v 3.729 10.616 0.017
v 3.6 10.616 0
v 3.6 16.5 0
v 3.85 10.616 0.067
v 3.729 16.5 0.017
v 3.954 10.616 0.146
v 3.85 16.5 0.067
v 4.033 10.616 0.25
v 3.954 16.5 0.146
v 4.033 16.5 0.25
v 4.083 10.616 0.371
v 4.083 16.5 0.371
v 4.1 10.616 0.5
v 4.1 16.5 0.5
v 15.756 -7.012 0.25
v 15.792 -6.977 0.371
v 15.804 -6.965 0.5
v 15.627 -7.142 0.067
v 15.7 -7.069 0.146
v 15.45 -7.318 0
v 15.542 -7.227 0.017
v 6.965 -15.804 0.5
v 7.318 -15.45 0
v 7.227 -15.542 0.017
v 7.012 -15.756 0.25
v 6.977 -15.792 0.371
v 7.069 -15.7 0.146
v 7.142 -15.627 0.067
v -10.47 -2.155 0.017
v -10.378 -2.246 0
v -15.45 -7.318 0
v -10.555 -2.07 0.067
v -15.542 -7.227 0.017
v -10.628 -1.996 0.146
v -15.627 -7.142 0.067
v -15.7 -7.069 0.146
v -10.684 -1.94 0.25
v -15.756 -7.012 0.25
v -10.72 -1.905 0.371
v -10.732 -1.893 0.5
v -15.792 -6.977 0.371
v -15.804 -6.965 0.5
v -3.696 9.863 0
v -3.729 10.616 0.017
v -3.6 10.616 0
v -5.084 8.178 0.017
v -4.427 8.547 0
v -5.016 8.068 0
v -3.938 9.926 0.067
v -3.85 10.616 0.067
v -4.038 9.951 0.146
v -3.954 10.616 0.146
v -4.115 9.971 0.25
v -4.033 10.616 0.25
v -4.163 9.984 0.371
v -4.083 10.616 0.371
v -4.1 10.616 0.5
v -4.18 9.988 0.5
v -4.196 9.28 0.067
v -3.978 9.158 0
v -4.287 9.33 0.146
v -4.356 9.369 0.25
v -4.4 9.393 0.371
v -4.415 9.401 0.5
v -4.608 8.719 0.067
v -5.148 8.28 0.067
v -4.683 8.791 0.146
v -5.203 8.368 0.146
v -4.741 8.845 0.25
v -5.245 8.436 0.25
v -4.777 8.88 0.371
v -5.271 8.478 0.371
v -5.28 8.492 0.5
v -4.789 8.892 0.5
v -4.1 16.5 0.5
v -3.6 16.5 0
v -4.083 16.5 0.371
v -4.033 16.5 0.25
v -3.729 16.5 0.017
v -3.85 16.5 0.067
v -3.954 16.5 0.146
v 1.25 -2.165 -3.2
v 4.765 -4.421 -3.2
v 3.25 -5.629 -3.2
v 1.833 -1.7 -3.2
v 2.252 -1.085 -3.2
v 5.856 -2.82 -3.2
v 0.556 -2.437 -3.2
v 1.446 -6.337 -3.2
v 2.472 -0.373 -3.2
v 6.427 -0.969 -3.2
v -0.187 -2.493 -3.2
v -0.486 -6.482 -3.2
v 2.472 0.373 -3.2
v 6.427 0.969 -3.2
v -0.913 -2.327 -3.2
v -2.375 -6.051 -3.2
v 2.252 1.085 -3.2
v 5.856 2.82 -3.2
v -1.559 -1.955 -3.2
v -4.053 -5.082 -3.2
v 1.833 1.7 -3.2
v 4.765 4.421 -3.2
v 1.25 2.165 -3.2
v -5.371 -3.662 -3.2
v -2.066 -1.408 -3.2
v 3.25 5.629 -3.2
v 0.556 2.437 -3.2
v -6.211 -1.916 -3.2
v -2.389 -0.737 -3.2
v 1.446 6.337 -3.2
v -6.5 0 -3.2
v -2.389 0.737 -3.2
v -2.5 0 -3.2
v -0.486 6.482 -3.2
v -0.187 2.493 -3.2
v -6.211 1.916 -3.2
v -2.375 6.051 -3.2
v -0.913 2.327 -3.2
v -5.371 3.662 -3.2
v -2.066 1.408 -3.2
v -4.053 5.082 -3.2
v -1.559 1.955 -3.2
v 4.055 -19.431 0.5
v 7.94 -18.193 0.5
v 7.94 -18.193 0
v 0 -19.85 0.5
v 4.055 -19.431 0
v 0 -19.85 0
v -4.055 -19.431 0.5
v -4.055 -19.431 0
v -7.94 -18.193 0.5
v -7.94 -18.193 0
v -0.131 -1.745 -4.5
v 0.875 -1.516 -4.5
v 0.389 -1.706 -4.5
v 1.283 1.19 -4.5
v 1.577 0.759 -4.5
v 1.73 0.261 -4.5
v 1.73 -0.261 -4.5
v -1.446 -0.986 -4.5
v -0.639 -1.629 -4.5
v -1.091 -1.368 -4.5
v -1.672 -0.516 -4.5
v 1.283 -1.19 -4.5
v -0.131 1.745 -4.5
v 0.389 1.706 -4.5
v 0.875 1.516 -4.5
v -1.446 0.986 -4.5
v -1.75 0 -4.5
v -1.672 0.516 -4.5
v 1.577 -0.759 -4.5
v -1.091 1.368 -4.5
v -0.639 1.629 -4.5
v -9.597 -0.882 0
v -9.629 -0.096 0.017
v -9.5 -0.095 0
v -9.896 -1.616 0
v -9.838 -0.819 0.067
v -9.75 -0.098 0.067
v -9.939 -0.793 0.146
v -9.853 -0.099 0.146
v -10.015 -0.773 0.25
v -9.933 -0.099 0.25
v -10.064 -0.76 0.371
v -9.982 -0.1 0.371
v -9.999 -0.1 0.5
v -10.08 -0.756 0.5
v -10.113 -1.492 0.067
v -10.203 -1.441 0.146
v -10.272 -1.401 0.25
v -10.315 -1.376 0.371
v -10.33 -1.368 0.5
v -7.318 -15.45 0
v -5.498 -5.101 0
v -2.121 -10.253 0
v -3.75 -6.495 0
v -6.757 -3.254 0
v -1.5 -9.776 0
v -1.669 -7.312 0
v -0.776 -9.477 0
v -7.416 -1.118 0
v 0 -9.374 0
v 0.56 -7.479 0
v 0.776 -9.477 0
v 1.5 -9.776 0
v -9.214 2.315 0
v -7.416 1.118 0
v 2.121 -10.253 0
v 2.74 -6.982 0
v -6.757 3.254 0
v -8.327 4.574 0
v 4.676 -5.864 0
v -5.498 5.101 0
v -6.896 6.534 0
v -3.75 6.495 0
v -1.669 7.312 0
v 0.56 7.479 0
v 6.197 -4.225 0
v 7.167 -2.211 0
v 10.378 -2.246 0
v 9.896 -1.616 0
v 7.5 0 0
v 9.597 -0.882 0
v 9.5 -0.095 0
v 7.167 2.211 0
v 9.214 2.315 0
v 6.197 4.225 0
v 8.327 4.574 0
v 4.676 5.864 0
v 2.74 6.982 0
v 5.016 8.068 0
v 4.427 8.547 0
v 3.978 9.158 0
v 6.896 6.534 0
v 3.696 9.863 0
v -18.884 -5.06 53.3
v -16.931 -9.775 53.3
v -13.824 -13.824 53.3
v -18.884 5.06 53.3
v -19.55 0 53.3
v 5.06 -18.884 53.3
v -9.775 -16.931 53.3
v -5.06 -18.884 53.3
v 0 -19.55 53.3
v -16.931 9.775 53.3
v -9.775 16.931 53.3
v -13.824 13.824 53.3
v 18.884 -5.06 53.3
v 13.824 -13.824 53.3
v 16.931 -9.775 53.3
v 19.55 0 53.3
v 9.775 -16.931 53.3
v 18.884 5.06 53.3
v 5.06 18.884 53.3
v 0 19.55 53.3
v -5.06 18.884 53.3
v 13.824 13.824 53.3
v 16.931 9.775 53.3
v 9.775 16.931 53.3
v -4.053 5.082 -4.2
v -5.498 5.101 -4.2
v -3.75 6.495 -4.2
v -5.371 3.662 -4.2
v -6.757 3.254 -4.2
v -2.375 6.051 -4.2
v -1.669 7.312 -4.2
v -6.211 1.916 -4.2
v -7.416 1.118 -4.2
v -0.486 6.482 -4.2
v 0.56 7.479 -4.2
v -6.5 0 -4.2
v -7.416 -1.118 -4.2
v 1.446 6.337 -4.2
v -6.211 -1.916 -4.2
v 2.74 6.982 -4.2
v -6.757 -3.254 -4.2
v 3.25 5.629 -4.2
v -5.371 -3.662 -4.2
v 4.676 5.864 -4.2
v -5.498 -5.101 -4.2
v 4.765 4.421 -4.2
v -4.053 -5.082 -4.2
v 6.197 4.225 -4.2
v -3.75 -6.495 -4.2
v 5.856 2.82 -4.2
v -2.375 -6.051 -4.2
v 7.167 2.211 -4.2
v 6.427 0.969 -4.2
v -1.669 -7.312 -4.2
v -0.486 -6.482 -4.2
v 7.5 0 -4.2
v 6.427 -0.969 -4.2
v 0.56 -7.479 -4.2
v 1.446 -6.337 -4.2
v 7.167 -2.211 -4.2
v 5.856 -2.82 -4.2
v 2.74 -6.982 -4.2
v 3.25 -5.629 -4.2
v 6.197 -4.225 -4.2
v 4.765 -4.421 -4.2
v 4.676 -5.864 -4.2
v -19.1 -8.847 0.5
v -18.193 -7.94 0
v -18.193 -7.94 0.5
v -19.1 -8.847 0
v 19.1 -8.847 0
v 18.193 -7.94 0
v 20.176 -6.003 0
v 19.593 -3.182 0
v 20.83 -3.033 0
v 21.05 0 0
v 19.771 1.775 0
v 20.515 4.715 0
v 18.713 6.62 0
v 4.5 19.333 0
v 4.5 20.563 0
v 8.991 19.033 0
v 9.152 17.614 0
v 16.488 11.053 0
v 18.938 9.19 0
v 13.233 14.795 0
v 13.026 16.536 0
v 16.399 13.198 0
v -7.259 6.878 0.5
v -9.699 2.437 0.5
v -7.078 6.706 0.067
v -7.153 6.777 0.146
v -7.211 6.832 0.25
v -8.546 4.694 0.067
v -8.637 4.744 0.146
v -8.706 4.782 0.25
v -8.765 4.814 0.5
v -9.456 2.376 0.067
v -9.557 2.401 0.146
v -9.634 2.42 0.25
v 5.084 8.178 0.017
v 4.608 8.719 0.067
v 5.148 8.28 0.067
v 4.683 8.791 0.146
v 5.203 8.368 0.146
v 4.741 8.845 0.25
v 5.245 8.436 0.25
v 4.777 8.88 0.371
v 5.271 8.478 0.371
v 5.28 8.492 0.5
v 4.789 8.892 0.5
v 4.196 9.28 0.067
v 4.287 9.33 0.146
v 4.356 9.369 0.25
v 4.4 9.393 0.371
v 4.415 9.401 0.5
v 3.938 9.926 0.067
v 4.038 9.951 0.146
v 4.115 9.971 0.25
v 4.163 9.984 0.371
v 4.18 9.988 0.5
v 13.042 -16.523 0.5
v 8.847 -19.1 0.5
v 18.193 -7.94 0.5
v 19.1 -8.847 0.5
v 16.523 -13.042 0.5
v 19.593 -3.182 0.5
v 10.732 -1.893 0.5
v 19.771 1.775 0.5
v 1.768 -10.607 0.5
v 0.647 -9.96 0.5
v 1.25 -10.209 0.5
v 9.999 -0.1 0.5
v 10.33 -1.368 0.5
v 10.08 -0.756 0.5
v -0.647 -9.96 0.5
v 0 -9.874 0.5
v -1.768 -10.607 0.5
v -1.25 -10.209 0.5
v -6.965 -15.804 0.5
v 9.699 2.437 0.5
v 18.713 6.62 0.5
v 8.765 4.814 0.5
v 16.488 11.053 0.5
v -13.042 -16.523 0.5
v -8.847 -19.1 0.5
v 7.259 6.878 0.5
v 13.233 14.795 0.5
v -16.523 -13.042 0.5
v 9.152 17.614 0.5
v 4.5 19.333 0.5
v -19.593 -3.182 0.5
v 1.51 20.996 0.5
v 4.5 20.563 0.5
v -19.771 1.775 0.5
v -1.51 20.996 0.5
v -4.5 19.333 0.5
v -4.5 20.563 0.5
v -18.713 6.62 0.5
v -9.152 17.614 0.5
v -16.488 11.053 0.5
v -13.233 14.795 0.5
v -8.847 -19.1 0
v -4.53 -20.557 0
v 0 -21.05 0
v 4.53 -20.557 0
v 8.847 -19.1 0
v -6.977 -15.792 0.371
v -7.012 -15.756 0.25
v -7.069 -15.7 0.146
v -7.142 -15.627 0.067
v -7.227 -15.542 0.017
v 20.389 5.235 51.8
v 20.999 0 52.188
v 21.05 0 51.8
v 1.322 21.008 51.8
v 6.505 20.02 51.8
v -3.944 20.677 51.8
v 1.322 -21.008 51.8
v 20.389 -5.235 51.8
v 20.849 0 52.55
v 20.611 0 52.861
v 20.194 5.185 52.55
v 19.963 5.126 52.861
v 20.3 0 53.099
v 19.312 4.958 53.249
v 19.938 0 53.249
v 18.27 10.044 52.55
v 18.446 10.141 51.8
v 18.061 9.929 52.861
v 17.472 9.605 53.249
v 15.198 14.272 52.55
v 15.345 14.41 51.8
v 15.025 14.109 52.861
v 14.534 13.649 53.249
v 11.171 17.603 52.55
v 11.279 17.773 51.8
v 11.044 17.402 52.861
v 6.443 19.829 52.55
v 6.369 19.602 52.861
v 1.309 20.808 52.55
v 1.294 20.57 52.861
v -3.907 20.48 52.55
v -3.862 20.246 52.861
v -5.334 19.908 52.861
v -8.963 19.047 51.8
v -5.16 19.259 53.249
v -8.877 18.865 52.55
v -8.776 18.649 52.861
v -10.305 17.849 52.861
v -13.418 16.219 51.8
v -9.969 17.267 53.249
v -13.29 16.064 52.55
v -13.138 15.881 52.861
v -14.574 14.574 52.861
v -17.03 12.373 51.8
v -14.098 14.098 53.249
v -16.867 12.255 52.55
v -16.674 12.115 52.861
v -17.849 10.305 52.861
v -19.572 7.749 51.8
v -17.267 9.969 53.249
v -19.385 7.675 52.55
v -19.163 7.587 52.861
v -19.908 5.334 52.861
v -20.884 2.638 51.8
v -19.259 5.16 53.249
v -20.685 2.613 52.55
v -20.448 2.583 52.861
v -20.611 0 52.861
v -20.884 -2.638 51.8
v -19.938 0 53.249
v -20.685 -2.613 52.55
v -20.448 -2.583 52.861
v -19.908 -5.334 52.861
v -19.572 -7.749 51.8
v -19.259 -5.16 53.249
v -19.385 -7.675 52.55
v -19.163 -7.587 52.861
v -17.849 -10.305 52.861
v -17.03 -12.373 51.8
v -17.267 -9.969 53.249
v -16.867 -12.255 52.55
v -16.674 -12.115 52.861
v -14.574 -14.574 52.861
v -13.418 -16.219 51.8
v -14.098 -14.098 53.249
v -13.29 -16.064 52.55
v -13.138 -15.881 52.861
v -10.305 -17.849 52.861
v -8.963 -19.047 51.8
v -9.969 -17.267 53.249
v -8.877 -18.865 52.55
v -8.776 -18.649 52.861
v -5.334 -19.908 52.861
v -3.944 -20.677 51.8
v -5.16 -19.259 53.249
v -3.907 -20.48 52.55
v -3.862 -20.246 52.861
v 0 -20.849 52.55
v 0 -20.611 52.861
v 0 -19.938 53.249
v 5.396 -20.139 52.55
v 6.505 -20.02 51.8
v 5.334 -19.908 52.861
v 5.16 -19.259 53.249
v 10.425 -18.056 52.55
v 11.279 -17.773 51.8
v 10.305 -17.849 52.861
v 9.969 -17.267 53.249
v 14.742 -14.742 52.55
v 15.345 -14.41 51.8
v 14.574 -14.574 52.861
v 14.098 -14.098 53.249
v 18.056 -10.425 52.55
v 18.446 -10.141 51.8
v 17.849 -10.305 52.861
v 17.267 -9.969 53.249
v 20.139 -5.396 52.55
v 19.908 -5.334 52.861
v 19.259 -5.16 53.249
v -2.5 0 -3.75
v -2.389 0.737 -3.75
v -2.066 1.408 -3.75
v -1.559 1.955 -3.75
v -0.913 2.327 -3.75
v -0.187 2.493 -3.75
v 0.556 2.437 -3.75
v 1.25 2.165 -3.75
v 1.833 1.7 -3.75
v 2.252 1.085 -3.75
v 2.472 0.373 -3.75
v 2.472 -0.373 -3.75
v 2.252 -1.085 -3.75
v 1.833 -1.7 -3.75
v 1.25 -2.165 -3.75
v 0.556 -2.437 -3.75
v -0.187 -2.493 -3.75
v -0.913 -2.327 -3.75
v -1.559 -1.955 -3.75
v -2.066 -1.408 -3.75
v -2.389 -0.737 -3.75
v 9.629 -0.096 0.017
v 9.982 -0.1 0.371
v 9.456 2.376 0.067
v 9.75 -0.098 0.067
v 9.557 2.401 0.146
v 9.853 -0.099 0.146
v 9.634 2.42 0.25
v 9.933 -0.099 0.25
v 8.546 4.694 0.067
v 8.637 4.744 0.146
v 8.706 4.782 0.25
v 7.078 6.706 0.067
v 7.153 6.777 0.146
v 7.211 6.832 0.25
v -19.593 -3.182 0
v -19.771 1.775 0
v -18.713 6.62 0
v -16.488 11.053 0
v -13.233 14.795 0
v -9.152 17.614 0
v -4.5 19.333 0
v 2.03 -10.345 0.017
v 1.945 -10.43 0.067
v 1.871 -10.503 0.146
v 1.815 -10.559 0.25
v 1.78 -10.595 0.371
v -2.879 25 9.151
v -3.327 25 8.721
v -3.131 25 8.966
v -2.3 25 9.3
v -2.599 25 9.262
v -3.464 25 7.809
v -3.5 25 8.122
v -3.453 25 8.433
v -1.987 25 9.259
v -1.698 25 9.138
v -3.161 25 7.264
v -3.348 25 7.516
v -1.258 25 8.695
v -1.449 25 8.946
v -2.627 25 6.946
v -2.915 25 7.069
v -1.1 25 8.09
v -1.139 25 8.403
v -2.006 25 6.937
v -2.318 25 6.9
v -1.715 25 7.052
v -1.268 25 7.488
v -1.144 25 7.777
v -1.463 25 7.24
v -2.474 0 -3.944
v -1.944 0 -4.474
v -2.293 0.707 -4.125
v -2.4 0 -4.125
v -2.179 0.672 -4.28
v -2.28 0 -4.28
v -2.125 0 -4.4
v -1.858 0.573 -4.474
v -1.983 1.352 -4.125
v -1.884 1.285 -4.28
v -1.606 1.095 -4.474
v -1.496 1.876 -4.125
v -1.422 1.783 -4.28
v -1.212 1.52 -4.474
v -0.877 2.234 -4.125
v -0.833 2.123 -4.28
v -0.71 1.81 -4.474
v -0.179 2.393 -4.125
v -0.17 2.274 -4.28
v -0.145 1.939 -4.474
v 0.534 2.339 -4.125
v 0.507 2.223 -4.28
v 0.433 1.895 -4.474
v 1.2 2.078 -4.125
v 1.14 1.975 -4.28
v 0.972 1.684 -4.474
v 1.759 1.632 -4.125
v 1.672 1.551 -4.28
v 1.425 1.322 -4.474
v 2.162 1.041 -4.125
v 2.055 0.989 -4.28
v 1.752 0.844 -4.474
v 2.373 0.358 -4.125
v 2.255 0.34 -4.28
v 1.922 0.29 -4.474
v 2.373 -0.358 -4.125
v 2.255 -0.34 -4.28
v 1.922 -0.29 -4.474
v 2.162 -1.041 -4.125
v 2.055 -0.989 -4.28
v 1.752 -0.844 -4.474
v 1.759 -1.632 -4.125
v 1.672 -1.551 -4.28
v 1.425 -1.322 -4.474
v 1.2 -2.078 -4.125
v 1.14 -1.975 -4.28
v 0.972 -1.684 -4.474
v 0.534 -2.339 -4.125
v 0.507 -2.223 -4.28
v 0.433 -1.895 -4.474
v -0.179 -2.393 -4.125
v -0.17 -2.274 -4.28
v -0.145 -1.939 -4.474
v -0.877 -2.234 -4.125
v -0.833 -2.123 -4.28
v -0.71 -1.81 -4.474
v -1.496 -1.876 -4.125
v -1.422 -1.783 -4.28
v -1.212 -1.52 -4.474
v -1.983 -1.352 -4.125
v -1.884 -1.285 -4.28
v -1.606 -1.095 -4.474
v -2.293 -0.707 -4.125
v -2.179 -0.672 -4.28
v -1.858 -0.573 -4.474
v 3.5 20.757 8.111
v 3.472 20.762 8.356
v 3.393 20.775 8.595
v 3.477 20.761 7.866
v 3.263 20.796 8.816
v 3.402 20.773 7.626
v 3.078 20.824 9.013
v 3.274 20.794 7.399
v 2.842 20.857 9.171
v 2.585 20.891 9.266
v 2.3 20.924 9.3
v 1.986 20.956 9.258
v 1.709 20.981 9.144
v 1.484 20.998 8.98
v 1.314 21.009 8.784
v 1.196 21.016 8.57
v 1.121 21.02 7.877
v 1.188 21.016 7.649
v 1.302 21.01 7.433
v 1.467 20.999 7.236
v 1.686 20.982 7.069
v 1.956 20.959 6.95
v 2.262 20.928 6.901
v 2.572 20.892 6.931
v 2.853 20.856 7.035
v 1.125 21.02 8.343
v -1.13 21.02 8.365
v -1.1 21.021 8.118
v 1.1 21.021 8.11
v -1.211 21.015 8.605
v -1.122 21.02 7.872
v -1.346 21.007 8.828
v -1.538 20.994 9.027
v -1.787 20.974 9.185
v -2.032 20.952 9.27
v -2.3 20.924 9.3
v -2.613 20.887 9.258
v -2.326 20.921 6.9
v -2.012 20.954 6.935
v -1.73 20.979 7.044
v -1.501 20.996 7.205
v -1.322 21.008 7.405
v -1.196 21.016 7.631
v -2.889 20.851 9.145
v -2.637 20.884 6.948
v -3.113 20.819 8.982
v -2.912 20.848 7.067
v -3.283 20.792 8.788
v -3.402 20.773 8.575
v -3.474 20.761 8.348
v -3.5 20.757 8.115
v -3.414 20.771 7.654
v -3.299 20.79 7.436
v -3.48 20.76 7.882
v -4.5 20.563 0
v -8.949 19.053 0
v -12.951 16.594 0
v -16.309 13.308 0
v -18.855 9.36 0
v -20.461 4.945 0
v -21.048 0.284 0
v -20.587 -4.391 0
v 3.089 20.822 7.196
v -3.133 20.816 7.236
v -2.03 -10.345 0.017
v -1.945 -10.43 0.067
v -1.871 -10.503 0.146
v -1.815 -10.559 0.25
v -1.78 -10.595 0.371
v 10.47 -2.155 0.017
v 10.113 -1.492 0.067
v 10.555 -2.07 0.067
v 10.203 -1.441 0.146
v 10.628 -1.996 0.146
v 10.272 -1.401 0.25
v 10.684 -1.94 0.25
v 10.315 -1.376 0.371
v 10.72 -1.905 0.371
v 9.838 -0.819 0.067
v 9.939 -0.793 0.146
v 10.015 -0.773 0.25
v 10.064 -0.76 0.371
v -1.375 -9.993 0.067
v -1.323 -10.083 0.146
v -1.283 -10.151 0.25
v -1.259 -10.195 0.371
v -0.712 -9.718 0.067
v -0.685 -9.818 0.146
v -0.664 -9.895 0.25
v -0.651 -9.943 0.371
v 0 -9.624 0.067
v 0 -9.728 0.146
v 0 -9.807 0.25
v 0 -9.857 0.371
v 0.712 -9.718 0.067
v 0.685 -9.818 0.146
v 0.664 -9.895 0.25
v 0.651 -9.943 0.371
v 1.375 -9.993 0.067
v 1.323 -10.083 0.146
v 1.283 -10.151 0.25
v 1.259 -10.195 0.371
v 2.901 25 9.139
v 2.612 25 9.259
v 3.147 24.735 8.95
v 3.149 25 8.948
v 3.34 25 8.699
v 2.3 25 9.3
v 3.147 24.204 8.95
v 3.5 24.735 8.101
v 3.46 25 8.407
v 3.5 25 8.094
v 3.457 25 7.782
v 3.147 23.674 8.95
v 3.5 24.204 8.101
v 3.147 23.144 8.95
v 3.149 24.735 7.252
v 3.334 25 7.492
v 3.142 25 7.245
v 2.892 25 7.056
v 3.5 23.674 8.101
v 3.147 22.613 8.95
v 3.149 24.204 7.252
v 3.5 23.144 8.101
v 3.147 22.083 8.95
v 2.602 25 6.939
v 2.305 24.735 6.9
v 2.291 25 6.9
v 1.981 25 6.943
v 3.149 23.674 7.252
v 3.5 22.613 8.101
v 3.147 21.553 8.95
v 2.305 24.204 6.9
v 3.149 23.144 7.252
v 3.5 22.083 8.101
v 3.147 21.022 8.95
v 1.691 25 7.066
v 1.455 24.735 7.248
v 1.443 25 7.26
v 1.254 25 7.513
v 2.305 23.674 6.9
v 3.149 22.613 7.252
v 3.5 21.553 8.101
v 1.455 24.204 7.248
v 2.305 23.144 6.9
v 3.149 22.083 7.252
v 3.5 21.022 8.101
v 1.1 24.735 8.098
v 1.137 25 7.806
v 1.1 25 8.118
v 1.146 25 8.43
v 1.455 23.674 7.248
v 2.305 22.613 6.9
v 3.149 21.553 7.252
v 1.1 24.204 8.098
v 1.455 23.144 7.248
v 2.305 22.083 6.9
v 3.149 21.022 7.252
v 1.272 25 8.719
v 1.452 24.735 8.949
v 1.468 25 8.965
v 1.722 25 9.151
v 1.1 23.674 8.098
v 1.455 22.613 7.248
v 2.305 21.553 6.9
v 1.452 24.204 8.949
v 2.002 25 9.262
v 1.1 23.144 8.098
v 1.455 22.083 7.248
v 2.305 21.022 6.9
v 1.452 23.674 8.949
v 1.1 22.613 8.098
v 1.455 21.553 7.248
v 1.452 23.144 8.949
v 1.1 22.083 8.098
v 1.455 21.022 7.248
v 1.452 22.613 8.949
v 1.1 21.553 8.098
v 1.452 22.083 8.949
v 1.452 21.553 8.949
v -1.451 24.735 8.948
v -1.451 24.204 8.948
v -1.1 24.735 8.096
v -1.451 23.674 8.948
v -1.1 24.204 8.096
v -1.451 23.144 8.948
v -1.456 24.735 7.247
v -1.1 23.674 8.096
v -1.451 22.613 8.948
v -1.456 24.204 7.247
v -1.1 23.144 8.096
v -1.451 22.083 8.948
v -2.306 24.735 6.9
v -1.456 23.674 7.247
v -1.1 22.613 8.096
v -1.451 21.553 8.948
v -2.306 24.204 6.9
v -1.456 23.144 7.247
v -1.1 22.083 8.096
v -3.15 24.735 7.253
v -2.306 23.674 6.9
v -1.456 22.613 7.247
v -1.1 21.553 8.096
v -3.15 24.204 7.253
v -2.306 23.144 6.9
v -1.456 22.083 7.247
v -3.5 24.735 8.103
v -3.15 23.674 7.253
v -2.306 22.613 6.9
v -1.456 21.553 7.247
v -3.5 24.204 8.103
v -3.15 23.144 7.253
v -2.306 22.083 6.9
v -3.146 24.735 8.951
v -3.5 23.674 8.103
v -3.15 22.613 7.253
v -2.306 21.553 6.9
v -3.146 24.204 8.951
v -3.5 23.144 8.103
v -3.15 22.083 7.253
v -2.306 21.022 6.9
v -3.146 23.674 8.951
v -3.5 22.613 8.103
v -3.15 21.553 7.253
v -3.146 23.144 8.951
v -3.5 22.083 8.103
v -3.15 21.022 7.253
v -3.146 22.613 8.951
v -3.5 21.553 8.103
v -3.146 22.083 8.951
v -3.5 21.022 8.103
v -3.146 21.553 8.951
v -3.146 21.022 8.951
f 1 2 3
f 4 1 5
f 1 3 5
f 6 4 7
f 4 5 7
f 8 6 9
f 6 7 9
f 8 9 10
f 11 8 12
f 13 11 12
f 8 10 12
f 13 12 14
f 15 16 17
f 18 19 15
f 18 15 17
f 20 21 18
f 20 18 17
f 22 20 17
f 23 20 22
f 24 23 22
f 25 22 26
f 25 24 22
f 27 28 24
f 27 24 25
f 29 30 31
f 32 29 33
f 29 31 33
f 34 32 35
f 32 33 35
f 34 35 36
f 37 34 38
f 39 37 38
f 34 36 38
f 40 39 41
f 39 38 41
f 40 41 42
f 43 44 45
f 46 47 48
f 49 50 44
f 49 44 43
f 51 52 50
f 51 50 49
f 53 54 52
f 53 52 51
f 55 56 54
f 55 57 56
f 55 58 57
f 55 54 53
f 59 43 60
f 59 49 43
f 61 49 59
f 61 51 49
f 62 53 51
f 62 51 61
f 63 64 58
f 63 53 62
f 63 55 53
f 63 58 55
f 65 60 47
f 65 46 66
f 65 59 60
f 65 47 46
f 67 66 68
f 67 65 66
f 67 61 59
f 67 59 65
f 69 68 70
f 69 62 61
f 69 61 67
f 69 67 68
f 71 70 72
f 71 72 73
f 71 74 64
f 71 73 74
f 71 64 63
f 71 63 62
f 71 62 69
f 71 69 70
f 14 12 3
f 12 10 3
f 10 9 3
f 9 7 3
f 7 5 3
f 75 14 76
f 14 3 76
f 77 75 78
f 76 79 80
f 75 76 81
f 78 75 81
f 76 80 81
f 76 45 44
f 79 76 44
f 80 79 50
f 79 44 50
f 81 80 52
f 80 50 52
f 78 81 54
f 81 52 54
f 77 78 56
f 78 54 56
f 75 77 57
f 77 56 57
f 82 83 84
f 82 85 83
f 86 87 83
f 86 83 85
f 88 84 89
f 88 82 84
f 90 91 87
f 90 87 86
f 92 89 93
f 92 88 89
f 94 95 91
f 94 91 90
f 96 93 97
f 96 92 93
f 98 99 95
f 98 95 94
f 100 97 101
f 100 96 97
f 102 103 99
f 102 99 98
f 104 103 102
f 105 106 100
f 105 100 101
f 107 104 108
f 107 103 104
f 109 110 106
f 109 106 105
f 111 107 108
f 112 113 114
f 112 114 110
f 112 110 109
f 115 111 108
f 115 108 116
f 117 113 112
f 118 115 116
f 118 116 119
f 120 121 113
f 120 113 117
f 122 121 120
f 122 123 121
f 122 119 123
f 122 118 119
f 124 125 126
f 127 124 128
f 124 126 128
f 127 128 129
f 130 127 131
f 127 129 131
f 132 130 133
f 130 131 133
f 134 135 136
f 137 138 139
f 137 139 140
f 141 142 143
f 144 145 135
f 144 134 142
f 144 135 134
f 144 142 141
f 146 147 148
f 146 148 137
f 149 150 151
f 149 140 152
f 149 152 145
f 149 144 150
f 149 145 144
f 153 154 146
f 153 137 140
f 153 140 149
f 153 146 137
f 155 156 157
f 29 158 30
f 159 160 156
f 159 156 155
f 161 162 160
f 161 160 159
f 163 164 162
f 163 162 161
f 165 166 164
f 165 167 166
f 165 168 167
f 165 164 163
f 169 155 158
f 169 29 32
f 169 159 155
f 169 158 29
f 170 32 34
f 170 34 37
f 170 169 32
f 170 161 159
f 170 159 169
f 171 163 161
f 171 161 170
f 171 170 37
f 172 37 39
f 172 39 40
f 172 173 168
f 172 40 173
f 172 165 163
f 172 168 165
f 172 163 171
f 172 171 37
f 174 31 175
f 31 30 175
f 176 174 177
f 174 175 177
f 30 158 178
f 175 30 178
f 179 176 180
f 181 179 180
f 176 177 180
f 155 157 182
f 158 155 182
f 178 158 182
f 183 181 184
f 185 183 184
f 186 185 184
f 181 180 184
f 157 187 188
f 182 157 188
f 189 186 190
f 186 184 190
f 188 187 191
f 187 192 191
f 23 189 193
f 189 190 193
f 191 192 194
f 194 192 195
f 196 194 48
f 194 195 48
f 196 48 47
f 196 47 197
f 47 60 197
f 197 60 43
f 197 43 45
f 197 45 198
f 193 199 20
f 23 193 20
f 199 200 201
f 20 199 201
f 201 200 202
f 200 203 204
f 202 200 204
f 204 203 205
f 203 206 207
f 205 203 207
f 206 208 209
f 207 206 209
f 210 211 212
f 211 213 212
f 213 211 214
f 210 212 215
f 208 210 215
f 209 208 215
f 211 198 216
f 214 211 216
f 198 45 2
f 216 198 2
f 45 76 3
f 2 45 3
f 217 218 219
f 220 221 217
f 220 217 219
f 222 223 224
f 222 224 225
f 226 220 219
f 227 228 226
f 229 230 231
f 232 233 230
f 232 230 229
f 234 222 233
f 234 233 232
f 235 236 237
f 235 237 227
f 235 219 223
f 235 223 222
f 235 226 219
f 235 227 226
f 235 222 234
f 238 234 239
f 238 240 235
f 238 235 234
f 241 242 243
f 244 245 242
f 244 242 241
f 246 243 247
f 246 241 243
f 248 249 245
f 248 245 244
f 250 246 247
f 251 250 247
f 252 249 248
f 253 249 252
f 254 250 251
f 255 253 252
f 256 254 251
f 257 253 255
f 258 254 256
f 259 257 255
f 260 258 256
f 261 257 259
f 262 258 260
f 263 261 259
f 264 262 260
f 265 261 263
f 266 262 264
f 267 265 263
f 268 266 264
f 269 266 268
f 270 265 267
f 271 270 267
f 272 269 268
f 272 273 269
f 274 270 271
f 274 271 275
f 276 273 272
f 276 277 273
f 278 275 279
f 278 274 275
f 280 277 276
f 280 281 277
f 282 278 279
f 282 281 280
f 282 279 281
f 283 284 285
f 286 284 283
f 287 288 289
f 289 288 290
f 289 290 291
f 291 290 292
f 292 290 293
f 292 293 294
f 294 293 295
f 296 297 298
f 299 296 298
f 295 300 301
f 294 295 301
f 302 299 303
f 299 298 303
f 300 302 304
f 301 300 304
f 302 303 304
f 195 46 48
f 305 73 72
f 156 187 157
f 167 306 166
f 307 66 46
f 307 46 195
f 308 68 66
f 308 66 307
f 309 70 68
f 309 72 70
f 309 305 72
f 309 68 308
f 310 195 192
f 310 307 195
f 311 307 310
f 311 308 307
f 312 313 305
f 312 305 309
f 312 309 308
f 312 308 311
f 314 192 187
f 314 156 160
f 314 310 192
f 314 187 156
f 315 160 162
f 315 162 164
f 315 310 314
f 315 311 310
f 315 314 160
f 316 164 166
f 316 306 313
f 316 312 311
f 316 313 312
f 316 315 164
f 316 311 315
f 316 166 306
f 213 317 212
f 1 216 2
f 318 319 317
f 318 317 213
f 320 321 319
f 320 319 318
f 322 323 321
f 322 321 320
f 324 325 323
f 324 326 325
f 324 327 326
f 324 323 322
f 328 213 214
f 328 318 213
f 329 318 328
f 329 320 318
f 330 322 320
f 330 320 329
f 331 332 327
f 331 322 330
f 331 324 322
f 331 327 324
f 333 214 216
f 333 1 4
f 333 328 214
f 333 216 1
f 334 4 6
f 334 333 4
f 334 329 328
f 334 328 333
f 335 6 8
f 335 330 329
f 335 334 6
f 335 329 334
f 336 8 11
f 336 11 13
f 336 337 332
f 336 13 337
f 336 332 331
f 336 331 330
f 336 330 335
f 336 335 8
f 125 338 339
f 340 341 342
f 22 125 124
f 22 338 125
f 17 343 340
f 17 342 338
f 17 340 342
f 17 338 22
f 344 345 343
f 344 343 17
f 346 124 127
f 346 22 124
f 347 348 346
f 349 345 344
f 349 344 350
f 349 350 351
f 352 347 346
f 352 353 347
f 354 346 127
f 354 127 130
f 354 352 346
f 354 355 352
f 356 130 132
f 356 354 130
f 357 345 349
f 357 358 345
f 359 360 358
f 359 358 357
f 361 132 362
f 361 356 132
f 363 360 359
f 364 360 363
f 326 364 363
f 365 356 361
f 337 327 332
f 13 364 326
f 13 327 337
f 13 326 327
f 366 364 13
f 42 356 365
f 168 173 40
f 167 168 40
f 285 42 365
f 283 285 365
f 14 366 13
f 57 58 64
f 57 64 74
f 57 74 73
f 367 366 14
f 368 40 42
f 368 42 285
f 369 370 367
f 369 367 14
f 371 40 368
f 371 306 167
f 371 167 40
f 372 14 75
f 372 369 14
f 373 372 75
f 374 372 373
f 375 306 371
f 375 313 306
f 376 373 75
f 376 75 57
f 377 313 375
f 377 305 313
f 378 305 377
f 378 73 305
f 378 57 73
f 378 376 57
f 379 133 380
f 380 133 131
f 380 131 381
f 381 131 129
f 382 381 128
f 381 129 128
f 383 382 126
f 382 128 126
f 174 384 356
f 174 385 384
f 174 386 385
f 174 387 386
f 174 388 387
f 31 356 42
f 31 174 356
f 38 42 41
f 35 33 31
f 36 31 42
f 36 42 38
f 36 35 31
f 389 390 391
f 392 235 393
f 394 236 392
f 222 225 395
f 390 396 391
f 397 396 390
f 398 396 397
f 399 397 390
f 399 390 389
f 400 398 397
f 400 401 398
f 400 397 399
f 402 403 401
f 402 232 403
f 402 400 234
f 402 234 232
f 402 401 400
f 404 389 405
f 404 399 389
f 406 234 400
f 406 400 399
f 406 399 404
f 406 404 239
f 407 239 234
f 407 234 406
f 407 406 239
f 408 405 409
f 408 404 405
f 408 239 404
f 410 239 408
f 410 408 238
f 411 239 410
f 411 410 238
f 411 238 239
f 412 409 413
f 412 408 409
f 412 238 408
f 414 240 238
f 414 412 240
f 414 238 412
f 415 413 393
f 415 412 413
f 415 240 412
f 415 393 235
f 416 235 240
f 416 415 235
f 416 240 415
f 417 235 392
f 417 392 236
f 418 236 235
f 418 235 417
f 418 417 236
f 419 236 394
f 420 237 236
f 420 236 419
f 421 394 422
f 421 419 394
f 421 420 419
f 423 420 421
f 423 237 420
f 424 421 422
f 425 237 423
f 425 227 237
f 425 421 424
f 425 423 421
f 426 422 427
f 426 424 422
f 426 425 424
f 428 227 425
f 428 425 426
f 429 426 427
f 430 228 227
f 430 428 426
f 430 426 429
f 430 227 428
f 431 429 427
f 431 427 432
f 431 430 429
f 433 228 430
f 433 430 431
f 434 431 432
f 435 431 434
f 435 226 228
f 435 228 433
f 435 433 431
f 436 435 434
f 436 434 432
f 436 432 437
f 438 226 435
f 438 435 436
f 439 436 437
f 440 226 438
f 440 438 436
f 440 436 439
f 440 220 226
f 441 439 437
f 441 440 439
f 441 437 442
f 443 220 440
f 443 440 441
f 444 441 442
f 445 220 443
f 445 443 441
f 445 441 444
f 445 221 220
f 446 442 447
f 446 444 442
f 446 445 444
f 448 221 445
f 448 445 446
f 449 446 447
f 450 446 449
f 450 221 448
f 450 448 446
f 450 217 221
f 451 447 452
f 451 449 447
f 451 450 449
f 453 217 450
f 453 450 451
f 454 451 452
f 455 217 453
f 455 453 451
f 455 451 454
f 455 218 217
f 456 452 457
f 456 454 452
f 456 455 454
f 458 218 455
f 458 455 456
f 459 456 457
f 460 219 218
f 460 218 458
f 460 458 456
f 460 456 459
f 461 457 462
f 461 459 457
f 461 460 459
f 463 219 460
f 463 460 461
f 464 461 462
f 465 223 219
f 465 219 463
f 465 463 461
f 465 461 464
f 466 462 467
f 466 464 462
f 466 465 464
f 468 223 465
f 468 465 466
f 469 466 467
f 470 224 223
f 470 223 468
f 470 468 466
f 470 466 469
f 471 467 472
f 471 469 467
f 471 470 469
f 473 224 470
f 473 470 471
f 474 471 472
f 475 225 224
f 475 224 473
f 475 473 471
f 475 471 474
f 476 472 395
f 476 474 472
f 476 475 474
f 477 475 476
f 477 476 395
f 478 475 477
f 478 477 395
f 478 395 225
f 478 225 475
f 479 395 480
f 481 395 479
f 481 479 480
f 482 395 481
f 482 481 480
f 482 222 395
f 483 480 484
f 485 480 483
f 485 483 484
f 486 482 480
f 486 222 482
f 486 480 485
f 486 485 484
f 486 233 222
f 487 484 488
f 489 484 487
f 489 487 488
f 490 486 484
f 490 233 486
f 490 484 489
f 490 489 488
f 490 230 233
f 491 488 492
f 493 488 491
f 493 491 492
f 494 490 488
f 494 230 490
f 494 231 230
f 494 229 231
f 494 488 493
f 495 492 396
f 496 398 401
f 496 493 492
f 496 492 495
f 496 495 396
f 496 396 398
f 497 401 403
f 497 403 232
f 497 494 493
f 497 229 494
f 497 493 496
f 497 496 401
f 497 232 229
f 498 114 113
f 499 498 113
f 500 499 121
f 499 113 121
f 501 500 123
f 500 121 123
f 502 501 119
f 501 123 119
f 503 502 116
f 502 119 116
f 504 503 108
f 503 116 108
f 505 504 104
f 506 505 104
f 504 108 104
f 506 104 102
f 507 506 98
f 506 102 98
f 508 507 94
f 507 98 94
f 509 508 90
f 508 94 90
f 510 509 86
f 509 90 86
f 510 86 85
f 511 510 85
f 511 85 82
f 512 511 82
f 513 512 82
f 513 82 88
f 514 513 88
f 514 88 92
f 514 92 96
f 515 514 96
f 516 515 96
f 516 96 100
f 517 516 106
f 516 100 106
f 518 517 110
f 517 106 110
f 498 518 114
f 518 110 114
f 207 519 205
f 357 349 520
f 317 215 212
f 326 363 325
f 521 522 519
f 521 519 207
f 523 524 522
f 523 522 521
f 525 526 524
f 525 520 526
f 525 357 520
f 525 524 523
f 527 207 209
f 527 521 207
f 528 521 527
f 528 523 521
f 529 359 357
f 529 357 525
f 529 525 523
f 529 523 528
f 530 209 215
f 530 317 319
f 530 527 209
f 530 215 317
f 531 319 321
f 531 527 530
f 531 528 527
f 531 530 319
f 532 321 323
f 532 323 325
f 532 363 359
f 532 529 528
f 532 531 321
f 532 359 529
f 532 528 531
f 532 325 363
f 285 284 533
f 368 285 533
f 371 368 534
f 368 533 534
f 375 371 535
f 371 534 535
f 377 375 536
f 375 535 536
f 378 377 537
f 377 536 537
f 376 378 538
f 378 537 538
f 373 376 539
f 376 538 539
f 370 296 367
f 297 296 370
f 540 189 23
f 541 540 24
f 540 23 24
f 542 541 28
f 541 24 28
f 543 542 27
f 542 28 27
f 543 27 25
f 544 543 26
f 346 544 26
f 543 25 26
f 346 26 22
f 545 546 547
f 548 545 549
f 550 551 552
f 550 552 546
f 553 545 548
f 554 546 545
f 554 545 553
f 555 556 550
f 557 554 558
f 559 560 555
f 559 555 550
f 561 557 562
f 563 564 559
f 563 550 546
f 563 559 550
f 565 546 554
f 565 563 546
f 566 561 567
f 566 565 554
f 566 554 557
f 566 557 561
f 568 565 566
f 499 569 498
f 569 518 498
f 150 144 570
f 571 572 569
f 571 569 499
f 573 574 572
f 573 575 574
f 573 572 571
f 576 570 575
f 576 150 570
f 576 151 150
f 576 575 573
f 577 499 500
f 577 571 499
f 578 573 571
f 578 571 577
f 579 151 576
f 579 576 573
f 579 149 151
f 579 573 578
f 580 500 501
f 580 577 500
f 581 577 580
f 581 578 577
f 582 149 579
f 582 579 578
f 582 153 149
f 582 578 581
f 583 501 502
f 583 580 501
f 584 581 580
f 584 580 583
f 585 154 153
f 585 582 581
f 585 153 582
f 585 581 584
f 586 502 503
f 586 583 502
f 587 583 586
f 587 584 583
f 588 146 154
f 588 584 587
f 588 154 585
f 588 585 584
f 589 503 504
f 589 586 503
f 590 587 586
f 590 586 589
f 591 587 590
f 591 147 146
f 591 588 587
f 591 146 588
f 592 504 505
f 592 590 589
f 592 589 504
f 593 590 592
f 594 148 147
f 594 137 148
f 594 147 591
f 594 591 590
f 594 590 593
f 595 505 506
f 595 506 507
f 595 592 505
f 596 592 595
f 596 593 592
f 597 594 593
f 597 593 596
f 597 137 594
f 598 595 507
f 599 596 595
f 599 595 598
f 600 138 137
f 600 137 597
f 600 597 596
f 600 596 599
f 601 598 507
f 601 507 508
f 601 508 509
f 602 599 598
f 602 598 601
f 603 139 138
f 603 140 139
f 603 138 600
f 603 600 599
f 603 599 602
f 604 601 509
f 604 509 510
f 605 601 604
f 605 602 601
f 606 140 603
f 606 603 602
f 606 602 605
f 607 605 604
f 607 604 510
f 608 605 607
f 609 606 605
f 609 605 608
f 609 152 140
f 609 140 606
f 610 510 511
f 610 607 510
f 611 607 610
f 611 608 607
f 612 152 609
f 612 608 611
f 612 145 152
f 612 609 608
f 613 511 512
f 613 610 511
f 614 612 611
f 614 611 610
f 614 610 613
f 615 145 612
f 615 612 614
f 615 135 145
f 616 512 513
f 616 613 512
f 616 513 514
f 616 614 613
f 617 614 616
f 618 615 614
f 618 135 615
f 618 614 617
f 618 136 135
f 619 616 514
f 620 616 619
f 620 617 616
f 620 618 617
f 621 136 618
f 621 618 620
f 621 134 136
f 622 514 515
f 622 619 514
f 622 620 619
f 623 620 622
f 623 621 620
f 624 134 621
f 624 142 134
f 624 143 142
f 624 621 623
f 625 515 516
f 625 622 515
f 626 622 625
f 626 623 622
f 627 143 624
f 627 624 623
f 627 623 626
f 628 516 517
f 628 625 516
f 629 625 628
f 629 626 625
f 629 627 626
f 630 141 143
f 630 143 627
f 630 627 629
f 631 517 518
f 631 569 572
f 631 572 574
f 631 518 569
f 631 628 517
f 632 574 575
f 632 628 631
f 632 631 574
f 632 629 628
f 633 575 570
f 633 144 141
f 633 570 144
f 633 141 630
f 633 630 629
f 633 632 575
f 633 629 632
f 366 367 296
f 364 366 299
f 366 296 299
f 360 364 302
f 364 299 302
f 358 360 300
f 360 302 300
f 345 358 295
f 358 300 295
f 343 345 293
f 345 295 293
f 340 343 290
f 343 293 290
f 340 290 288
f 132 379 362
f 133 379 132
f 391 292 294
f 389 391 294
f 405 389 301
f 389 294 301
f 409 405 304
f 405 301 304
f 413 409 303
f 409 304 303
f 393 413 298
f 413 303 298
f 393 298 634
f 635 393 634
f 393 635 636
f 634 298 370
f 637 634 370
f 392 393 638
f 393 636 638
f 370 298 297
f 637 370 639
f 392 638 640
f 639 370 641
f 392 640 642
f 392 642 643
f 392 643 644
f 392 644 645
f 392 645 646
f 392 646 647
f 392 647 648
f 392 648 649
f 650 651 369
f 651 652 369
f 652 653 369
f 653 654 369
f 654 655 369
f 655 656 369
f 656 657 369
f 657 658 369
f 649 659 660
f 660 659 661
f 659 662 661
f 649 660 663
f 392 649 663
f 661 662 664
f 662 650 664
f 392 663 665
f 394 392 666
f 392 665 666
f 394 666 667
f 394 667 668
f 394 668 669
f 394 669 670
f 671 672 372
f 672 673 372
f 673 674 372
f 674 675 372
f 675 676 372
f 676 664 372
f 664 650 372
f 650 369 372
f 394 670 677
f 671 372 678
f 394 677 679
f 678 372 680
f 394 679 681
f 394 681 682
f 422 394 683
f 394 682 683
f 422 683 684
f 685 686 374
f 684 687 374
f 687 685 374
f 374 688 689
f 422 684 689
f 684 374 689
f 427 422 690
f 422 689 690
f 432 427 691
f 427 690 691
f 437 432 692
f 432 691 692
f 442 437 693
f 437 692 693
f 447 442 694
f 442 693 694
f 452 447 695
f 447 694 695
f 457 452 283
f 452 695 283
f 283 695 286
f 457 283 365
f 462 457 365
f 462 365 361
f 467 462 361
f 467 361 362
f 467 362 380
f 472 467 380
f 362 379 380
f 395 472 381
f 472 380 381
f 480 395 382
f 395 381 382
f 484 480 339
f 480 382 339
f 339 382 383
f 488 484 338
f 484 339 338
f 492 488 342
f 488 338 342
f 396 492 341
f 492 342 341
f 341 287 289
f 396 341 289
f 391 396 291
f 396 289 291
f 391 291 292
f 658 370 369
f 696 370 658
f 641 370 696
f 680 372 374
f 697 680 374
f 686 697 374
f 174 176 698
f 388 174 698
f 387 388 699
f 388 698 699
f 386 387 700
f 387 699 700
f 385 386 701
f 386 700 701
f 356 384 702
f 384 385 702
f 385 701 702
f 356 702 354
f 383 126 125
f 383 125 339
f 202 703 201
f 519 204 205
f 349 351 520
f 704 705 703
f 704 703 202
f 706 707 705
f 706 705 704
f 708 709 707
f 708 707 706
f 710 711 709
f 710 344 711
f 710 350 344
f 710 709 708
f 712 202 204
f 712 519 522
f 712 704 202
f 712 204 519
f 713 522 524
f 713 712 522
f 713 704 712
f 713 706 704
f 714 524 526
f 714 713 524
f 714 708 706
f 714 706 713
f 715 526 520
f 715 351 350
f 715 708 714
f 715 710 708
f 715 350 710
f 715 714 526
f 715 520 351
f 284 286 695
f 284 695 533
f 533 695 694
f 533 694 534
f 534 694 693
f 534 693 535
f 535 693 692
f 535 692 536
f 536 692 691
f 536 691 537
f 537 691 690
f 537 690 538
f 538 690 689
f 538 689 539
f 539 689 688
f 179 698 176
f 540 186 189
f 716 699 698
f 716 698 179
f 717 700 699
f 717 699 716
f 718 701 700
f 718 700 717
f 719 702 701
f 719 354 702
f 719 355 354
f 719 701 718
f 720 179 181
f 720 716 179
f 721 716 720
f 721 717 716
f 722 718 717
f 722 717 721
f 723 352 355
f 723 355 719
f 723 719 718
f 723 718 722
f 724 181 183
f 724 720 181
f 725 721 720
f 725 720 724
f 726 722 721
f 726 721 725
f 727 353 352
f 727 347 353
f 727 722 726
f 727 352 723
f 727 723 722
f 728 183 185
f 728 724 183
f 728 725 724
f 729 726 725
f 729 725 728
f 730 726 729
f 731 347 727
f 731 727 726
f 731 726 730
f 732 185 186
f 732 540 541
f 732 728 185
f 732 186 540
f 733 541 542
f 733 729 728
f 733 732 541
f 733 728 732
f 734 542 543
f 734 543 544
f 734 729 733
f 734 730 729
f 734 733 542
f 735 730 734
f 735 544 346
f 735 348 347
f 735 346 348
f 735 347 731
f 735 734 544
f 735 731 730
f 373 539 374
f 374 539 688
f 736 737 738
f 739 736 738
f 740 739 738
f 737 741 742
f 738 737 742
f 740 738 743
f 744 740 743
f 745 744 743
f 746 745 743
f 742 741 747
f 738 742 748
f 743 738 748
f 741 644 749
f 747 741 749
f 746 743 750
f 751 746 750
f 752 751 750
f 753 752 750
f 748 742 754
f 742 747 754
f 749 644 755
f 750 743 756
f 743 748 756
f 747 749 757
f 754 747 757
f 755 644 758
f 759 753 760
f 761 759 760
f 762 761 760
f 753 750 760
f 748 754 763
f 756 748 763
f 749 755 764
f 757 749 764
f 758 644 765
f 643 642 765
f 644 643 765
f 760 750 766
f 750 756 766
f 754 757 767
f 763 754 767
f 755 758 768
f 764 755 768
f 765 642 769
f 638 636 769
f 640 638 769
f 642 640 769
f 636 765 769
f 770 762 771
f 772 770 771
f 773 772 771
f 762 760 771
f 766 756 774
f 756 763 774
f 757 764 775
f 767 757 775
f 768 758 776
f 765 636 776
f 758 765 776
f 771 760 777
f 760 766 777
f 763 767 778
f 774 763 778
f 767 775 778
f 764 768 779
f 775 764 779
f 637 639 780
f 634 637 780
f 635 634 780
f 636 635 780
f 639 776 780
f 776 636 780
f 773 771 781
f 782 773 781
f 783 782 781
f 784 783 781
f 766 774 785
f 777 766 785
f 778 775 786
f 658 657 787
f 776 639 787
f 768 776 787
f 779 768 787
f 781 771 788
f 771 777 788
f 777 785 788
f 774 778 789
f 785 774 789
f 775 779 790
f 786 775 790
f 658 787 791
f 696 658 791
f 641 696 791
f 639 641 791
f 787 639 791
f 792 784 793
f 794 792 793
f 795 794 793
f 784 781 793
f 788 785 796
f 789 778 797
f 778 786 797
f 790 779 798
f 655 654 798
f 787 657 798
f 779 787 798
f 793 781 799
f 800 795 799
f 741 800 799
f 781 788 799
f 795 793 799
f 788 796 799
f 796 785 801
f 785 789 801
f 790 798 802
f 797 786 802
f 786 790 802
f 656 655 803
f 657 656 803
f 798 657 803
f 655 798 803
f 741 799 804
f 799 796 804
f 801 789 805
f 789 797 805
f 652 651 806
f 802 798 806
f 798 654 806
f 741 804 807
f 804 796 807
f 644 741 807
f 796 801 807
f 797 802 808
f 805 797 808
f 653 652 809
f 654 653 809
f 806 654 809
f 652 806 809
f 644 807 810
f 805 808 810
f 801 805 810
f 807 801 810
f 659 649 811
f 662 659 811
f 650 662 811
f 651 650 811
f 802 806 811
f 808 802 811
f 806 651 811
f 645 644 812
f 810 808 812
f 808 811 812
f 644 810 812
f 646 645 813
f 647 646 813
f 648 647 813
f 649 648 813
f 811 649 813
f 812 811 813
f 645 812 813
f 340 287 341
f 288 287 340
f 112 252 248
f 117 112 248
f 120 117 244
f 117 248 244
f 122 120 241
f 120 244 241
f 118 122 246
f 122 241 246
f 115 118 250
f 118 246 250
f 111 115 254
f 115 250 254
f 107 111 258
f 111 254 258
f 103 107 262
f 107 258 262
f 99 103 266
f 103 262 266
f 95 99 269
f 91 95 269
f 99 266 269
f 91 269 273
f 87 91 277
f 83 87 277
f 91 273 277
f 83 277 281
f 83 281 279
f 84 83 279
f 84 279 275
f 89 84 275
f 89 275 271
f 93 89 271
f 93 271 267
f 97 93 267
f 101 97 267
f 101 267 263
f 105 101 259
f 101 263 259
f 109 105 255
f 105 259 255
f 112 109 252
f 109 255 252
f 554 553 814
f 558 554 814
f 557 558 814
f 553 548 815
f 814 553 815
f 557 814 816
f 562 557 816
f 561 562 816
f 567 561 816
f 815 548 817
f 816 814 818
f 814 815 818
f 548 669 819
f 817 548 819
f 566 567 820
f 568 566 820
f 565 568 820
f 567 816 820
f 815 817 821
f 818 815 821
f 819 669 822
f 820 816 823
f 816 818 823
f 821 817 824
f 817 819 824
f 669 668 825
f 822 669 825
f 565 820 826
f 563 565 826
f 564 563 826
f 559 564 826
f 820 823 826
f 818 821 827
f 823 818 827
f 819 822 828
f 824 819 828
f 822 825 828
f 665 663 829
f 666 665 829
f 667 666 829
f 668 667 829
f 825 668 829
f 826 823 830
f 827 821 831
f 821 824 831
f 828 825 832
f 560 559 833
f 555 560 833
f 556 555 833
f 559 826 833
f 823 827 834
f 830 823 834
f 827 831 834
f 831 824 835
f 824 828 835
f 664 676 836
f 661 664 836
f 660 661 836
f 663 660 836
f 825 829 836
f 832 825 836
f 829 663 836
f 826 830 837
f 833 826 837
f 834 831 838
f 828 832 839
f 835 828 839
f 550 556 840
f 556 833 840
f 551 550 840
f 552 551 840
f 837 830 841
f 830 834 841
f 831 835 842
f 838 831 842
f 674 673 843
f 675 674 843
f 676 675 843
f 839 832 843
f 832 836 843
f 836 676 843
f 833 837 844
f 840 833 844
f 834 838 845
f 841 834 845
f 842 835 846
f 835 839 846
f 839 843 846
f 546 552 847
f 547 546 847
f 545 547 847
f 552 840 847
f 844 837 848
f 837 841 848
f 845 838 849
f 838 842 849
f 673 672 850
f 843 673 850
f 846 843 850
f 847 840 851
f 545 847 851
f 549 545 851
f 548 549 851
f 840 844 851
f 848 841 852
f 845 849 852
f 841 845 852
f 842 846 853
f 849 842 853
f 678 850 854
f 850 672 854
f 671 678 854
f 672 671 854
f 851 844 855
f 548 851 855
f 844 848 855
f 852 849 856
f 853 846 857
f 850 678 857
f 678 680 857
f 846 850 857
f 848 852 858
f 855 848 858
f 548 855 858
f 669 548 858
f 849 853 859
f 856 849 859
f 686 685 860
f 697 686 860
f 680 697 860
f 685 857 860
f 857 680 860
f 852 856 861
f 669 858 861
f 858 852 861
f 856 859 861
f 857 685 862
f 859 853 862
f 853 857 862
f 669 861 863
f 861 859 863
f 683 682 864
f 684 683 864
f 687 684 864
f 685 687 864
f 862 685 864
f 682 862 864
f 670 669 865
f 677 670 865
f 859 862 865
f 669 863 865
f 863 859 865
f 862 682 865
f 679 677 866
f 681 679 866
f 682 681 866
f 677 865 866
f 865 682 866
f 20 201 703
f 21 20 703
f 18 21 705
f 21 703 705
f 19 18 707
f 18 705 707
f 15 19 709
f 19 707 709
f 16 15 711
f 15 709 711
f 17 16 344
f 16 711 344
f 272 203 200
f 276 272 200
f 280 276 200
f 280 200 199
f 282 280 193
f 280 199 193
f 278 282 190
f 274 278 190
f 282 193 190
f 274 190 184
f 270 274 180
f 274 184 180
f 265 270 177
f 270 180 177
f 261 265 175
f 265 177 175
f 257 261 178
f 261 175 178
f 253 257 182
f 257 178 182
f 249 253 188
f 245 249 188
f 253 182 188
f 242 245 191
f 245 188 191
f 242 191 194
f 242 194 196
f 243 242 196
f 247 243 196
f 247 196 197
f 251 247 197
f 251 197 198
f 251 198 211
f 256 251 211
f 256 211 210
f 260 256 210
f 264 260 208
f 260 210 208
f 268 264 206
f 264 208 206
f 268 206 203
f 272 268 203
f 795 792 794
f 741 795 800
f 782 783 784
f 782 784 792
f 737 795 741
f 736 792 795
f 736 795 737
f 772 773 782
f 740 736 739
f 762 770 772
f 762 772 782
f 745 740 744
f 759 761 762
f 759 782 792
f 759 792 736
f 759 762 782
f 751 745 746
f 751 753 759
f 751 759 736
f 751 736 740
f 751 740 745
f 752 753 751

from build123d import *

# Parameters (mm, degrees)
SKETCH_1_R          = 21.05
EXTRUDE_1_DEPTH     = 53.3
FILLET_1_R          = 1.5
CUT_EXTRUDE_1_DEPTH = 0.5
SKETCH_3_R          = 7.5
EXTRUDE_2_DEPTH     = 4.2
SKETCH_4_R          = 6.5
CUT_EXTRUDE_2_DEPTH = 1
SKETCH_5_R          = 2.5
EXTRUDE_3_DEPTH     = 1.3
FILLET_2_R          = 0.75
FILLET_3_R          = 2.5
FILLET_4_R          = 0.5
SKETCH_7_W          = 9
SKETCH_7_H          = 4.55
CUT_EXTRUDE_3_DEPTH = 0.5
SKETCH_9_R          = 21
EXTRUDE_4_DEPTH     = 39.2
EXTRUDE_5_DEPTH     = 2
SKETCH_11_R         = 8
EXTRUDE_6_DEPTH     = 0.5
SKETCH_12_R         = 7.1
EXTRUDE_7_DEPTH     = 1
SKETCH_13_R         = 4
EXTRUDE_8_DEPTH     = 20
SKETCH_14_W         = 8
SKETCH_14_H         = 12
CUT_EXTRUDE_4_DEPTH = 1
SKETCH_15_R         = 2
CUT_EXTRUDE_5_DEPTH = 6
CHAMFER_1_SIZE      = 0.5
EXTRUDE_9_DEPTH     = 25
CHAMFER_2_SIZE      = 0.2
OTHER_START         = 53.3
OTHER_1_OUTLINE_R   = 21
OTHER_1_DEPTH       = 61.2


# Read off the part's stored shape, not the designer's step: 交差1
with BuildPart() as part:
    # ｽｹｯﾁ1 → ﾎﾞｽ - 押し出し1 (new body)
    with BuildSketch(Plane.XY):
        Circle(SKETCH_1_R)
    extrude(amount=EXTRUDE_1_DEPTH)

    # ﾌｨﾚｯﾄ1
    fillet_1_edges = [part.edges().sort_by_distance(p)[0] for p in [
        (-21.05, 0, 53.3),
    ]]
    fillet(fillet_1_edges, radius=FILLET_1_R)

    # ｽｹｯﾁ2 → ｶｯﾄ - 押し出し1 (cut)
    with BuildSketch(Plane(origin=(0, 0, 0), x_dir=(-1, 0, 0), z_dir=(0, 0, -1))):
        with BuildLine():
            Line((-1.767766953, -10.606601718), (-8.902744604, -17.741579369))
            ThreePointArc((-8.902744604, -17.741579369), (0, -19.85), (8.902744604, -17.741579369))
            Line((8.902744604, -17.741579369), (1.767766953, -10.606601718))
            ThreePointArc((1.767766953, -10.606601718), (0, -9.874368671), (-1.767766953, -10.606601718))
        make_face()
        with BuildLine():
            Line((-17.741579369, -8.902744604), (-9.939267924, -1.100433159))
            ThreePointArc((-9.939267924, -1.100433159), (-8.682968675, 4.960449072), (-4.1, 9.120855223))
            Line((-4.1, 9.120855223), (-4.1, 19.421959221))
            ThreePointArc((-4.1, 19.421959221), (-17.883955352, 8.613166721), (-17.741579369, -8.902744604))
        make_face()
        with BuildLine():
            Line((4.1, 19.421959221), (4.1, 9.120855223))
            ThreePointArc((4.1, 9.120855223), (8.682968675, 4.960449072), (9.939267924, -1.100433159))
            Line((9.939267924, -1.100433159), (17.741579369, -8.902744604))
            ThreePointArc((17.741579369, -8.902744604), (17.883955352, 8.613166721), (4.1, 19.421959221))
        make_face()
    extrude(amount=-CUT_EXTRUDE_1_DEPTH, mode=Mode.SUBTRACT)

    # ｽｹｯﾁ3 → ﾎﾞｽ - 押し出し2 (add)
    with BuildSketch(Plane(origin=(0, 0, 0), x_dir=(-1, 0, 0), z_dir=(0, 0, -1))):
        with Locations(Location((0, 0, 0), (0, 0, 180))):
            Circle(SKETCH_3_R)
    extrude(amount=EXTRUDE_2_DEPTH)

    # ｽｹｯﾁ4 → ｶｯﾄ - 押し出し2 (cut)
    with BuildSketch(Plane(origin=(0, 0, -4.2), x_dir=(-1, 0, 0), z_dir=(0, 0, -1))):
        Circle(SKETCH_4_R)
    extrude(amount=-CUT_EXTRUDE_2_DEPTH, mode=Mode.SUBTRACT)

    # ｽｹｯﾁ5 → ﾎﾞｽ - 押し出し3 (add)
    with BuildSketch(Plane(origin=(0, 0, -3.2), x_dir=(-1, 0, 0), z_dir=(0, 0, -1))):
        Circle(SKETCH_5_R)
    extrude(amount=EXTRUDE_3_DEPTH)

    # ﾌｨﾚｯﾄ2
    fillet_2_edges = [part.edges().sort_by_distance(p)[0] for p in [
        (2.5, 0, -4.5),
    ]]
    fillet(fillet_2_edges, radius=FILLET_2_R)

    # ﾌｨﾚｯﾄ3
    fillet_3_edges = [part.edges().sort_by_distance(p)[0] for p in [
        (-9.939267924, -1.100433159, 0.25),
        (-4.1, 9.120855223, 0.25),
        (4.1, 9.120855223, 0.25),
        (9.939267924, -1.100433159, 0.25),
    ]]
    fillet(fillet_3_edges, radius=FILLET_3_R)

    # ﾌｨﾚｯﾄ4
    fillet_4_edges = [part.edges().sort_by_distance(p)[0] for p in [
        (5.335255779, -14.174090543, 0),
        (-5.335255779, -14.174090543, 0),
        (-14.236593669, -5.397758904, 0),
        (-10.184921124, -1.070153656, 0),
        (-8.764891514, 4.814216109, 0),
        (-4.414822662, 9.401058845, 0),
        (14.236593669, -5.397758904, 0),
        (10.184921124, -1.070153656, 0),
        (8.764891514, 4.814216109, 0),
        (4.414822662, 9.401058845, 0),
        (0, -9.874368671, 0),
        (-4.1, 15.018756923, 0),
        (4.1, 15.018756923, 0),
    ]]
    fillet(fillet_4_edges, radius=FILLET_4_R - 0.0001)  # a hair under: the kernel refuses the full size

    # ｽｹｯﾁ7 → ｶｯﾄ - 押し出し3 (cut)
    with BuildSketch(Plane(origin=(0, 0, 0), x_dir=(-1, 0, 0), z_dir=(0, 0, -1))):
        with Locations((0, 18.775)):
            Rectangle(SKETCH_7_W, SKETCH_7_H)
        Polygon((-6.257895014, -16.510943341), (-9.75807358, -20.011121908), (-20.011121908, -9.75807358), (-16.510943341, -6.257895014), align=None)
        Polygon((6.257895014, -16.510943341), (16.510943341, -6.257895014), (20.011121908, -9.75807358), (9.75807358, -20.011121908), align=None)
    extrude(amount=-CUT_EXTRUDE_3_DEPTH, mode=Mode.SUBTRACT)

    # ｽｹｯﾁ9 → ﾎﾞｽ - 押し出し4 (add)
    with BuildSketch(Plane.XY.offset(53.3)):
        Circle(SKETCH_9_R)
    extrude(amount=EXTRUDE_4_DEPTH)

    # ｽｹｯﾁ10 → ﾎﾞｽ - 押し出し5 (add)
    with BuildSketch(Plane.XY.offset(92.5)):
        with BuildLine():
            Line((4.667626369, 11.595829599), (11.595829599, 4.667626369))
            ThreePointArc((11.595829599, 4.667626369), (8.838834765, -8.838834765), (-4.667626369, -11.595829599))
            Line((-4.667626369, -11.595829599), (-11.595829599, -4.667626369))
            ThreePointArc((-11.595829599, -4.667626369), (-8.838834765, 8.838834765), (4.667626369, 11.595829599))
        make_face()
    extrude(amount=EXTRUDE_5_DEPTH)

    # ｽｹｯﾁ11 → ﾎﾞｽ - 押し出し6 (add)
    with BuildSketch(Plane.XY.offset(94.5)):
        Circle(SKETCH_11_R)
    extrude(amount=EXTRUDE_6_DEPTH)

    # ｽｹｯﾁ12 → ﾎﾞｽ - 押し出し7 (add)
    with BuildSketch(Plane.XY.offset(95)):
        Circle(SKETCH_12_R)
    extrude(amount=EXTRUDE_7_DEPTH)

    # ｽｹｯﾁ13 → ﾎﾞｽ - 押し出し8 (add)
    with BuildSketch(Plane.XY.offset(94.5)):
        Circle(SKETCH_13_R)
    extrude(amount=EXTRUDE_8_DEPTH)

    # ｽｹｯﾁ14 → ｶｯﾄ - 押し出し4 (cut)
    with BuildSketch(Plane(origin=(0, 4, 0), x_dir=(1, 0, 0), z_dir=(0, 1, 0))):
        with Locations((0, -108.5)):
            Rectangle(SKETCH_14_W, SKETCH_14_H)
    extrude(amount=-CUT_EXTRUDE_4_DEPTH, mode=Mode.SUBTRACT)

    # ｽｹｯﾁ15 → ｶｯﾄ - 押し出し5 (cut)
    with BuildSketch(Plane.XY.offset(92.5)):
        with Locations((0, 17.5)):
            Circle(SKETCH_15_R)
        with Locations((17.5, 0)):
            Circle(SKETCH_15_R)
        with Locations((0, -17.5)):
            Circle(SKETCH_15_R)
        with Locations((-17.5, 0)):
            Circle(SKETCH_15_R)
    extrude(amount=-CUT_EXTRUDE_5_DEPTH, mode=Mode.SUBTRACT)

    # 面取り1
    chamfer_1_edges = [part.edges().sort_by_distance(p)[0] for p in [
        (-21, 0, 53.3),
        (-21, 0, 92.5),
    ]]
    chamfer(chamfer_1_edges, length=CHAMFER_1_SIZE)

    # ｽｹｯﾁ19 → ﾎﾞｽ - 押し出し9 (add)
    with BuildSketch(Plane(origin=(0, 0, 0), x_dir=(1, 0, 0), z_dir=(0, 1, 0))):
        with BuildLine():
            add(Edge.make_bspline(
                [(-2.3, -9.3), (-2.141895722, -9.3), (-1.984582336, -9.26831111), (-1.695786007, -9.148505891), (-1.561830045, -9.059042657), (-1.339916148, -8.83681524), (-1.250815241, -8.703488676), (-1.130324814, -8.411202826), (-1.099488051, -8.254725269), (-1.100524759, -7.937433107), (-1.132539642, -7.780879651), (-1.254416503, -7.490445543), (-1.344667636, -7.357097524), (-1.567516387, -7.136655943), (-1.702165246, -7.047850886), (-1.991590037, -6.92982589), (-2.149326122, -6.899295567), (-2.461692814, -6.900729728), (-2.617940839, -6.932319306), (-2.907178904, -7.053148359), (-3.038602416, -7.141124571), (-3.26167511, -7.365046532), (-3.349599592, -7.497417785), (-3.469481665, -7.788427754), (-3.500435327, -7.946423907), (-3.499555239, -8.260305399), (-3.467445926, -8.418673048), (-3.34669763, -8.707376797), (-3.256905259, -8.840768765), (-3.035347061, -9.061077904), (-2.902667973, -9.149452405), (-2.612947139, -9.269026571), (-2.458104278, -9.3), (-2.3, -9.3)],
                knots=[0, 0, 0, 0, 0.0625, 0.0625, 0.125, 0.125, 0.1875, 0.1875, 0.25, 0.25, 0.3125, 0.3125, 0.375, 0.375, 0.4375, 0.4375, 0.5, 0.5, 0.5625, 0.5625, 0.625, 0.625, 0.6875, 0.6875, 0.75, 0.75, 0.8125, 0.8125, 0.875, 0.875, 0.9375, 0.9375, 1, 1, 1, 1], degree=3))
        make_face()
        with BuildLine():
            add(Edge.make_bspline(
                [(2.3, -9.3), (2.458101824, -9.3), (2.615002003, -9.268333612), (2.902663727, -9.149297919), (3.036114818, -9.060490649), (3.257502016, -8.83999811), (3.346925979, -8.707290324), (3.468262095, -8.416258156), (3.499849023, -8.259893759), (3.500149899, -7.94238048), (3.468784785, -7.78588338), (3.348388342, -7.495343893), (3.259144479, -7.362166602), (3.038513671, -7.141379213), (2.905239906, -7.052187197), (2.617888296, -6.932449554), (2.460768356, -6.900612609), (2.148510682, -6.899405329), (1.991426227, -6.92973338), (1.700237772, -7.048797353), (1.567538038, -7.136292434), (1.342020343, -7.360062317), (1.253313742, -7.492276634), (1.131817712, -7.783408851), (1.100245068, -7.941102293), (1.09975782, -8.255174381), (1.131152757, -8.41364744), (1.250962434, -8.703405981), (1.340590257, -8.837664202), (1.562488668, -9.059527262), (1.695817167, -9.148670082), (1.986527204, -9.268965629), (2.141898176, -9.3), (2.3, -9.3)],
                knots=[0, 0, 0, 0, 0.0625, 0.0625, 0.125, 0.125, 0.1875, 0.1875, 0.25, 0.25, 0.3125, 0.3125, 0.375, 0.375, 0.4375, 0.4375, 0.5, 0.5, 0.5625, 0.5625, 0.625, 0.625, 0.6875, 0.6875, 0.75, 0.75, 0.8125, 0.8125, 0.875, 0.875, 0.9375, 0.9375, 1, 1, 1, 1], degree=3))
        make_face()
    extrude(amount=EXTRUDE_9_DEPTH)

    # 面取り2
    chamfer_2_edges = [part.edges().sort_by_distance(p)[0] for p in [
        (-1.645751311, -3.645751311, 114.5),
    ]]
    chamfer(chamfer_2_edges, length=CHAMFER_2_SIZE)

    # 交差1 outline → 交差1 (cut)
    with BuildSketch(Plane.XY.offset(OTHER_START)):
        Circle(OTHER_1_OUTLINE_R)
    extrude(amount=OTHER_1_DEPTH, mode=Mode.SUBTRACT)


solid = part.part
